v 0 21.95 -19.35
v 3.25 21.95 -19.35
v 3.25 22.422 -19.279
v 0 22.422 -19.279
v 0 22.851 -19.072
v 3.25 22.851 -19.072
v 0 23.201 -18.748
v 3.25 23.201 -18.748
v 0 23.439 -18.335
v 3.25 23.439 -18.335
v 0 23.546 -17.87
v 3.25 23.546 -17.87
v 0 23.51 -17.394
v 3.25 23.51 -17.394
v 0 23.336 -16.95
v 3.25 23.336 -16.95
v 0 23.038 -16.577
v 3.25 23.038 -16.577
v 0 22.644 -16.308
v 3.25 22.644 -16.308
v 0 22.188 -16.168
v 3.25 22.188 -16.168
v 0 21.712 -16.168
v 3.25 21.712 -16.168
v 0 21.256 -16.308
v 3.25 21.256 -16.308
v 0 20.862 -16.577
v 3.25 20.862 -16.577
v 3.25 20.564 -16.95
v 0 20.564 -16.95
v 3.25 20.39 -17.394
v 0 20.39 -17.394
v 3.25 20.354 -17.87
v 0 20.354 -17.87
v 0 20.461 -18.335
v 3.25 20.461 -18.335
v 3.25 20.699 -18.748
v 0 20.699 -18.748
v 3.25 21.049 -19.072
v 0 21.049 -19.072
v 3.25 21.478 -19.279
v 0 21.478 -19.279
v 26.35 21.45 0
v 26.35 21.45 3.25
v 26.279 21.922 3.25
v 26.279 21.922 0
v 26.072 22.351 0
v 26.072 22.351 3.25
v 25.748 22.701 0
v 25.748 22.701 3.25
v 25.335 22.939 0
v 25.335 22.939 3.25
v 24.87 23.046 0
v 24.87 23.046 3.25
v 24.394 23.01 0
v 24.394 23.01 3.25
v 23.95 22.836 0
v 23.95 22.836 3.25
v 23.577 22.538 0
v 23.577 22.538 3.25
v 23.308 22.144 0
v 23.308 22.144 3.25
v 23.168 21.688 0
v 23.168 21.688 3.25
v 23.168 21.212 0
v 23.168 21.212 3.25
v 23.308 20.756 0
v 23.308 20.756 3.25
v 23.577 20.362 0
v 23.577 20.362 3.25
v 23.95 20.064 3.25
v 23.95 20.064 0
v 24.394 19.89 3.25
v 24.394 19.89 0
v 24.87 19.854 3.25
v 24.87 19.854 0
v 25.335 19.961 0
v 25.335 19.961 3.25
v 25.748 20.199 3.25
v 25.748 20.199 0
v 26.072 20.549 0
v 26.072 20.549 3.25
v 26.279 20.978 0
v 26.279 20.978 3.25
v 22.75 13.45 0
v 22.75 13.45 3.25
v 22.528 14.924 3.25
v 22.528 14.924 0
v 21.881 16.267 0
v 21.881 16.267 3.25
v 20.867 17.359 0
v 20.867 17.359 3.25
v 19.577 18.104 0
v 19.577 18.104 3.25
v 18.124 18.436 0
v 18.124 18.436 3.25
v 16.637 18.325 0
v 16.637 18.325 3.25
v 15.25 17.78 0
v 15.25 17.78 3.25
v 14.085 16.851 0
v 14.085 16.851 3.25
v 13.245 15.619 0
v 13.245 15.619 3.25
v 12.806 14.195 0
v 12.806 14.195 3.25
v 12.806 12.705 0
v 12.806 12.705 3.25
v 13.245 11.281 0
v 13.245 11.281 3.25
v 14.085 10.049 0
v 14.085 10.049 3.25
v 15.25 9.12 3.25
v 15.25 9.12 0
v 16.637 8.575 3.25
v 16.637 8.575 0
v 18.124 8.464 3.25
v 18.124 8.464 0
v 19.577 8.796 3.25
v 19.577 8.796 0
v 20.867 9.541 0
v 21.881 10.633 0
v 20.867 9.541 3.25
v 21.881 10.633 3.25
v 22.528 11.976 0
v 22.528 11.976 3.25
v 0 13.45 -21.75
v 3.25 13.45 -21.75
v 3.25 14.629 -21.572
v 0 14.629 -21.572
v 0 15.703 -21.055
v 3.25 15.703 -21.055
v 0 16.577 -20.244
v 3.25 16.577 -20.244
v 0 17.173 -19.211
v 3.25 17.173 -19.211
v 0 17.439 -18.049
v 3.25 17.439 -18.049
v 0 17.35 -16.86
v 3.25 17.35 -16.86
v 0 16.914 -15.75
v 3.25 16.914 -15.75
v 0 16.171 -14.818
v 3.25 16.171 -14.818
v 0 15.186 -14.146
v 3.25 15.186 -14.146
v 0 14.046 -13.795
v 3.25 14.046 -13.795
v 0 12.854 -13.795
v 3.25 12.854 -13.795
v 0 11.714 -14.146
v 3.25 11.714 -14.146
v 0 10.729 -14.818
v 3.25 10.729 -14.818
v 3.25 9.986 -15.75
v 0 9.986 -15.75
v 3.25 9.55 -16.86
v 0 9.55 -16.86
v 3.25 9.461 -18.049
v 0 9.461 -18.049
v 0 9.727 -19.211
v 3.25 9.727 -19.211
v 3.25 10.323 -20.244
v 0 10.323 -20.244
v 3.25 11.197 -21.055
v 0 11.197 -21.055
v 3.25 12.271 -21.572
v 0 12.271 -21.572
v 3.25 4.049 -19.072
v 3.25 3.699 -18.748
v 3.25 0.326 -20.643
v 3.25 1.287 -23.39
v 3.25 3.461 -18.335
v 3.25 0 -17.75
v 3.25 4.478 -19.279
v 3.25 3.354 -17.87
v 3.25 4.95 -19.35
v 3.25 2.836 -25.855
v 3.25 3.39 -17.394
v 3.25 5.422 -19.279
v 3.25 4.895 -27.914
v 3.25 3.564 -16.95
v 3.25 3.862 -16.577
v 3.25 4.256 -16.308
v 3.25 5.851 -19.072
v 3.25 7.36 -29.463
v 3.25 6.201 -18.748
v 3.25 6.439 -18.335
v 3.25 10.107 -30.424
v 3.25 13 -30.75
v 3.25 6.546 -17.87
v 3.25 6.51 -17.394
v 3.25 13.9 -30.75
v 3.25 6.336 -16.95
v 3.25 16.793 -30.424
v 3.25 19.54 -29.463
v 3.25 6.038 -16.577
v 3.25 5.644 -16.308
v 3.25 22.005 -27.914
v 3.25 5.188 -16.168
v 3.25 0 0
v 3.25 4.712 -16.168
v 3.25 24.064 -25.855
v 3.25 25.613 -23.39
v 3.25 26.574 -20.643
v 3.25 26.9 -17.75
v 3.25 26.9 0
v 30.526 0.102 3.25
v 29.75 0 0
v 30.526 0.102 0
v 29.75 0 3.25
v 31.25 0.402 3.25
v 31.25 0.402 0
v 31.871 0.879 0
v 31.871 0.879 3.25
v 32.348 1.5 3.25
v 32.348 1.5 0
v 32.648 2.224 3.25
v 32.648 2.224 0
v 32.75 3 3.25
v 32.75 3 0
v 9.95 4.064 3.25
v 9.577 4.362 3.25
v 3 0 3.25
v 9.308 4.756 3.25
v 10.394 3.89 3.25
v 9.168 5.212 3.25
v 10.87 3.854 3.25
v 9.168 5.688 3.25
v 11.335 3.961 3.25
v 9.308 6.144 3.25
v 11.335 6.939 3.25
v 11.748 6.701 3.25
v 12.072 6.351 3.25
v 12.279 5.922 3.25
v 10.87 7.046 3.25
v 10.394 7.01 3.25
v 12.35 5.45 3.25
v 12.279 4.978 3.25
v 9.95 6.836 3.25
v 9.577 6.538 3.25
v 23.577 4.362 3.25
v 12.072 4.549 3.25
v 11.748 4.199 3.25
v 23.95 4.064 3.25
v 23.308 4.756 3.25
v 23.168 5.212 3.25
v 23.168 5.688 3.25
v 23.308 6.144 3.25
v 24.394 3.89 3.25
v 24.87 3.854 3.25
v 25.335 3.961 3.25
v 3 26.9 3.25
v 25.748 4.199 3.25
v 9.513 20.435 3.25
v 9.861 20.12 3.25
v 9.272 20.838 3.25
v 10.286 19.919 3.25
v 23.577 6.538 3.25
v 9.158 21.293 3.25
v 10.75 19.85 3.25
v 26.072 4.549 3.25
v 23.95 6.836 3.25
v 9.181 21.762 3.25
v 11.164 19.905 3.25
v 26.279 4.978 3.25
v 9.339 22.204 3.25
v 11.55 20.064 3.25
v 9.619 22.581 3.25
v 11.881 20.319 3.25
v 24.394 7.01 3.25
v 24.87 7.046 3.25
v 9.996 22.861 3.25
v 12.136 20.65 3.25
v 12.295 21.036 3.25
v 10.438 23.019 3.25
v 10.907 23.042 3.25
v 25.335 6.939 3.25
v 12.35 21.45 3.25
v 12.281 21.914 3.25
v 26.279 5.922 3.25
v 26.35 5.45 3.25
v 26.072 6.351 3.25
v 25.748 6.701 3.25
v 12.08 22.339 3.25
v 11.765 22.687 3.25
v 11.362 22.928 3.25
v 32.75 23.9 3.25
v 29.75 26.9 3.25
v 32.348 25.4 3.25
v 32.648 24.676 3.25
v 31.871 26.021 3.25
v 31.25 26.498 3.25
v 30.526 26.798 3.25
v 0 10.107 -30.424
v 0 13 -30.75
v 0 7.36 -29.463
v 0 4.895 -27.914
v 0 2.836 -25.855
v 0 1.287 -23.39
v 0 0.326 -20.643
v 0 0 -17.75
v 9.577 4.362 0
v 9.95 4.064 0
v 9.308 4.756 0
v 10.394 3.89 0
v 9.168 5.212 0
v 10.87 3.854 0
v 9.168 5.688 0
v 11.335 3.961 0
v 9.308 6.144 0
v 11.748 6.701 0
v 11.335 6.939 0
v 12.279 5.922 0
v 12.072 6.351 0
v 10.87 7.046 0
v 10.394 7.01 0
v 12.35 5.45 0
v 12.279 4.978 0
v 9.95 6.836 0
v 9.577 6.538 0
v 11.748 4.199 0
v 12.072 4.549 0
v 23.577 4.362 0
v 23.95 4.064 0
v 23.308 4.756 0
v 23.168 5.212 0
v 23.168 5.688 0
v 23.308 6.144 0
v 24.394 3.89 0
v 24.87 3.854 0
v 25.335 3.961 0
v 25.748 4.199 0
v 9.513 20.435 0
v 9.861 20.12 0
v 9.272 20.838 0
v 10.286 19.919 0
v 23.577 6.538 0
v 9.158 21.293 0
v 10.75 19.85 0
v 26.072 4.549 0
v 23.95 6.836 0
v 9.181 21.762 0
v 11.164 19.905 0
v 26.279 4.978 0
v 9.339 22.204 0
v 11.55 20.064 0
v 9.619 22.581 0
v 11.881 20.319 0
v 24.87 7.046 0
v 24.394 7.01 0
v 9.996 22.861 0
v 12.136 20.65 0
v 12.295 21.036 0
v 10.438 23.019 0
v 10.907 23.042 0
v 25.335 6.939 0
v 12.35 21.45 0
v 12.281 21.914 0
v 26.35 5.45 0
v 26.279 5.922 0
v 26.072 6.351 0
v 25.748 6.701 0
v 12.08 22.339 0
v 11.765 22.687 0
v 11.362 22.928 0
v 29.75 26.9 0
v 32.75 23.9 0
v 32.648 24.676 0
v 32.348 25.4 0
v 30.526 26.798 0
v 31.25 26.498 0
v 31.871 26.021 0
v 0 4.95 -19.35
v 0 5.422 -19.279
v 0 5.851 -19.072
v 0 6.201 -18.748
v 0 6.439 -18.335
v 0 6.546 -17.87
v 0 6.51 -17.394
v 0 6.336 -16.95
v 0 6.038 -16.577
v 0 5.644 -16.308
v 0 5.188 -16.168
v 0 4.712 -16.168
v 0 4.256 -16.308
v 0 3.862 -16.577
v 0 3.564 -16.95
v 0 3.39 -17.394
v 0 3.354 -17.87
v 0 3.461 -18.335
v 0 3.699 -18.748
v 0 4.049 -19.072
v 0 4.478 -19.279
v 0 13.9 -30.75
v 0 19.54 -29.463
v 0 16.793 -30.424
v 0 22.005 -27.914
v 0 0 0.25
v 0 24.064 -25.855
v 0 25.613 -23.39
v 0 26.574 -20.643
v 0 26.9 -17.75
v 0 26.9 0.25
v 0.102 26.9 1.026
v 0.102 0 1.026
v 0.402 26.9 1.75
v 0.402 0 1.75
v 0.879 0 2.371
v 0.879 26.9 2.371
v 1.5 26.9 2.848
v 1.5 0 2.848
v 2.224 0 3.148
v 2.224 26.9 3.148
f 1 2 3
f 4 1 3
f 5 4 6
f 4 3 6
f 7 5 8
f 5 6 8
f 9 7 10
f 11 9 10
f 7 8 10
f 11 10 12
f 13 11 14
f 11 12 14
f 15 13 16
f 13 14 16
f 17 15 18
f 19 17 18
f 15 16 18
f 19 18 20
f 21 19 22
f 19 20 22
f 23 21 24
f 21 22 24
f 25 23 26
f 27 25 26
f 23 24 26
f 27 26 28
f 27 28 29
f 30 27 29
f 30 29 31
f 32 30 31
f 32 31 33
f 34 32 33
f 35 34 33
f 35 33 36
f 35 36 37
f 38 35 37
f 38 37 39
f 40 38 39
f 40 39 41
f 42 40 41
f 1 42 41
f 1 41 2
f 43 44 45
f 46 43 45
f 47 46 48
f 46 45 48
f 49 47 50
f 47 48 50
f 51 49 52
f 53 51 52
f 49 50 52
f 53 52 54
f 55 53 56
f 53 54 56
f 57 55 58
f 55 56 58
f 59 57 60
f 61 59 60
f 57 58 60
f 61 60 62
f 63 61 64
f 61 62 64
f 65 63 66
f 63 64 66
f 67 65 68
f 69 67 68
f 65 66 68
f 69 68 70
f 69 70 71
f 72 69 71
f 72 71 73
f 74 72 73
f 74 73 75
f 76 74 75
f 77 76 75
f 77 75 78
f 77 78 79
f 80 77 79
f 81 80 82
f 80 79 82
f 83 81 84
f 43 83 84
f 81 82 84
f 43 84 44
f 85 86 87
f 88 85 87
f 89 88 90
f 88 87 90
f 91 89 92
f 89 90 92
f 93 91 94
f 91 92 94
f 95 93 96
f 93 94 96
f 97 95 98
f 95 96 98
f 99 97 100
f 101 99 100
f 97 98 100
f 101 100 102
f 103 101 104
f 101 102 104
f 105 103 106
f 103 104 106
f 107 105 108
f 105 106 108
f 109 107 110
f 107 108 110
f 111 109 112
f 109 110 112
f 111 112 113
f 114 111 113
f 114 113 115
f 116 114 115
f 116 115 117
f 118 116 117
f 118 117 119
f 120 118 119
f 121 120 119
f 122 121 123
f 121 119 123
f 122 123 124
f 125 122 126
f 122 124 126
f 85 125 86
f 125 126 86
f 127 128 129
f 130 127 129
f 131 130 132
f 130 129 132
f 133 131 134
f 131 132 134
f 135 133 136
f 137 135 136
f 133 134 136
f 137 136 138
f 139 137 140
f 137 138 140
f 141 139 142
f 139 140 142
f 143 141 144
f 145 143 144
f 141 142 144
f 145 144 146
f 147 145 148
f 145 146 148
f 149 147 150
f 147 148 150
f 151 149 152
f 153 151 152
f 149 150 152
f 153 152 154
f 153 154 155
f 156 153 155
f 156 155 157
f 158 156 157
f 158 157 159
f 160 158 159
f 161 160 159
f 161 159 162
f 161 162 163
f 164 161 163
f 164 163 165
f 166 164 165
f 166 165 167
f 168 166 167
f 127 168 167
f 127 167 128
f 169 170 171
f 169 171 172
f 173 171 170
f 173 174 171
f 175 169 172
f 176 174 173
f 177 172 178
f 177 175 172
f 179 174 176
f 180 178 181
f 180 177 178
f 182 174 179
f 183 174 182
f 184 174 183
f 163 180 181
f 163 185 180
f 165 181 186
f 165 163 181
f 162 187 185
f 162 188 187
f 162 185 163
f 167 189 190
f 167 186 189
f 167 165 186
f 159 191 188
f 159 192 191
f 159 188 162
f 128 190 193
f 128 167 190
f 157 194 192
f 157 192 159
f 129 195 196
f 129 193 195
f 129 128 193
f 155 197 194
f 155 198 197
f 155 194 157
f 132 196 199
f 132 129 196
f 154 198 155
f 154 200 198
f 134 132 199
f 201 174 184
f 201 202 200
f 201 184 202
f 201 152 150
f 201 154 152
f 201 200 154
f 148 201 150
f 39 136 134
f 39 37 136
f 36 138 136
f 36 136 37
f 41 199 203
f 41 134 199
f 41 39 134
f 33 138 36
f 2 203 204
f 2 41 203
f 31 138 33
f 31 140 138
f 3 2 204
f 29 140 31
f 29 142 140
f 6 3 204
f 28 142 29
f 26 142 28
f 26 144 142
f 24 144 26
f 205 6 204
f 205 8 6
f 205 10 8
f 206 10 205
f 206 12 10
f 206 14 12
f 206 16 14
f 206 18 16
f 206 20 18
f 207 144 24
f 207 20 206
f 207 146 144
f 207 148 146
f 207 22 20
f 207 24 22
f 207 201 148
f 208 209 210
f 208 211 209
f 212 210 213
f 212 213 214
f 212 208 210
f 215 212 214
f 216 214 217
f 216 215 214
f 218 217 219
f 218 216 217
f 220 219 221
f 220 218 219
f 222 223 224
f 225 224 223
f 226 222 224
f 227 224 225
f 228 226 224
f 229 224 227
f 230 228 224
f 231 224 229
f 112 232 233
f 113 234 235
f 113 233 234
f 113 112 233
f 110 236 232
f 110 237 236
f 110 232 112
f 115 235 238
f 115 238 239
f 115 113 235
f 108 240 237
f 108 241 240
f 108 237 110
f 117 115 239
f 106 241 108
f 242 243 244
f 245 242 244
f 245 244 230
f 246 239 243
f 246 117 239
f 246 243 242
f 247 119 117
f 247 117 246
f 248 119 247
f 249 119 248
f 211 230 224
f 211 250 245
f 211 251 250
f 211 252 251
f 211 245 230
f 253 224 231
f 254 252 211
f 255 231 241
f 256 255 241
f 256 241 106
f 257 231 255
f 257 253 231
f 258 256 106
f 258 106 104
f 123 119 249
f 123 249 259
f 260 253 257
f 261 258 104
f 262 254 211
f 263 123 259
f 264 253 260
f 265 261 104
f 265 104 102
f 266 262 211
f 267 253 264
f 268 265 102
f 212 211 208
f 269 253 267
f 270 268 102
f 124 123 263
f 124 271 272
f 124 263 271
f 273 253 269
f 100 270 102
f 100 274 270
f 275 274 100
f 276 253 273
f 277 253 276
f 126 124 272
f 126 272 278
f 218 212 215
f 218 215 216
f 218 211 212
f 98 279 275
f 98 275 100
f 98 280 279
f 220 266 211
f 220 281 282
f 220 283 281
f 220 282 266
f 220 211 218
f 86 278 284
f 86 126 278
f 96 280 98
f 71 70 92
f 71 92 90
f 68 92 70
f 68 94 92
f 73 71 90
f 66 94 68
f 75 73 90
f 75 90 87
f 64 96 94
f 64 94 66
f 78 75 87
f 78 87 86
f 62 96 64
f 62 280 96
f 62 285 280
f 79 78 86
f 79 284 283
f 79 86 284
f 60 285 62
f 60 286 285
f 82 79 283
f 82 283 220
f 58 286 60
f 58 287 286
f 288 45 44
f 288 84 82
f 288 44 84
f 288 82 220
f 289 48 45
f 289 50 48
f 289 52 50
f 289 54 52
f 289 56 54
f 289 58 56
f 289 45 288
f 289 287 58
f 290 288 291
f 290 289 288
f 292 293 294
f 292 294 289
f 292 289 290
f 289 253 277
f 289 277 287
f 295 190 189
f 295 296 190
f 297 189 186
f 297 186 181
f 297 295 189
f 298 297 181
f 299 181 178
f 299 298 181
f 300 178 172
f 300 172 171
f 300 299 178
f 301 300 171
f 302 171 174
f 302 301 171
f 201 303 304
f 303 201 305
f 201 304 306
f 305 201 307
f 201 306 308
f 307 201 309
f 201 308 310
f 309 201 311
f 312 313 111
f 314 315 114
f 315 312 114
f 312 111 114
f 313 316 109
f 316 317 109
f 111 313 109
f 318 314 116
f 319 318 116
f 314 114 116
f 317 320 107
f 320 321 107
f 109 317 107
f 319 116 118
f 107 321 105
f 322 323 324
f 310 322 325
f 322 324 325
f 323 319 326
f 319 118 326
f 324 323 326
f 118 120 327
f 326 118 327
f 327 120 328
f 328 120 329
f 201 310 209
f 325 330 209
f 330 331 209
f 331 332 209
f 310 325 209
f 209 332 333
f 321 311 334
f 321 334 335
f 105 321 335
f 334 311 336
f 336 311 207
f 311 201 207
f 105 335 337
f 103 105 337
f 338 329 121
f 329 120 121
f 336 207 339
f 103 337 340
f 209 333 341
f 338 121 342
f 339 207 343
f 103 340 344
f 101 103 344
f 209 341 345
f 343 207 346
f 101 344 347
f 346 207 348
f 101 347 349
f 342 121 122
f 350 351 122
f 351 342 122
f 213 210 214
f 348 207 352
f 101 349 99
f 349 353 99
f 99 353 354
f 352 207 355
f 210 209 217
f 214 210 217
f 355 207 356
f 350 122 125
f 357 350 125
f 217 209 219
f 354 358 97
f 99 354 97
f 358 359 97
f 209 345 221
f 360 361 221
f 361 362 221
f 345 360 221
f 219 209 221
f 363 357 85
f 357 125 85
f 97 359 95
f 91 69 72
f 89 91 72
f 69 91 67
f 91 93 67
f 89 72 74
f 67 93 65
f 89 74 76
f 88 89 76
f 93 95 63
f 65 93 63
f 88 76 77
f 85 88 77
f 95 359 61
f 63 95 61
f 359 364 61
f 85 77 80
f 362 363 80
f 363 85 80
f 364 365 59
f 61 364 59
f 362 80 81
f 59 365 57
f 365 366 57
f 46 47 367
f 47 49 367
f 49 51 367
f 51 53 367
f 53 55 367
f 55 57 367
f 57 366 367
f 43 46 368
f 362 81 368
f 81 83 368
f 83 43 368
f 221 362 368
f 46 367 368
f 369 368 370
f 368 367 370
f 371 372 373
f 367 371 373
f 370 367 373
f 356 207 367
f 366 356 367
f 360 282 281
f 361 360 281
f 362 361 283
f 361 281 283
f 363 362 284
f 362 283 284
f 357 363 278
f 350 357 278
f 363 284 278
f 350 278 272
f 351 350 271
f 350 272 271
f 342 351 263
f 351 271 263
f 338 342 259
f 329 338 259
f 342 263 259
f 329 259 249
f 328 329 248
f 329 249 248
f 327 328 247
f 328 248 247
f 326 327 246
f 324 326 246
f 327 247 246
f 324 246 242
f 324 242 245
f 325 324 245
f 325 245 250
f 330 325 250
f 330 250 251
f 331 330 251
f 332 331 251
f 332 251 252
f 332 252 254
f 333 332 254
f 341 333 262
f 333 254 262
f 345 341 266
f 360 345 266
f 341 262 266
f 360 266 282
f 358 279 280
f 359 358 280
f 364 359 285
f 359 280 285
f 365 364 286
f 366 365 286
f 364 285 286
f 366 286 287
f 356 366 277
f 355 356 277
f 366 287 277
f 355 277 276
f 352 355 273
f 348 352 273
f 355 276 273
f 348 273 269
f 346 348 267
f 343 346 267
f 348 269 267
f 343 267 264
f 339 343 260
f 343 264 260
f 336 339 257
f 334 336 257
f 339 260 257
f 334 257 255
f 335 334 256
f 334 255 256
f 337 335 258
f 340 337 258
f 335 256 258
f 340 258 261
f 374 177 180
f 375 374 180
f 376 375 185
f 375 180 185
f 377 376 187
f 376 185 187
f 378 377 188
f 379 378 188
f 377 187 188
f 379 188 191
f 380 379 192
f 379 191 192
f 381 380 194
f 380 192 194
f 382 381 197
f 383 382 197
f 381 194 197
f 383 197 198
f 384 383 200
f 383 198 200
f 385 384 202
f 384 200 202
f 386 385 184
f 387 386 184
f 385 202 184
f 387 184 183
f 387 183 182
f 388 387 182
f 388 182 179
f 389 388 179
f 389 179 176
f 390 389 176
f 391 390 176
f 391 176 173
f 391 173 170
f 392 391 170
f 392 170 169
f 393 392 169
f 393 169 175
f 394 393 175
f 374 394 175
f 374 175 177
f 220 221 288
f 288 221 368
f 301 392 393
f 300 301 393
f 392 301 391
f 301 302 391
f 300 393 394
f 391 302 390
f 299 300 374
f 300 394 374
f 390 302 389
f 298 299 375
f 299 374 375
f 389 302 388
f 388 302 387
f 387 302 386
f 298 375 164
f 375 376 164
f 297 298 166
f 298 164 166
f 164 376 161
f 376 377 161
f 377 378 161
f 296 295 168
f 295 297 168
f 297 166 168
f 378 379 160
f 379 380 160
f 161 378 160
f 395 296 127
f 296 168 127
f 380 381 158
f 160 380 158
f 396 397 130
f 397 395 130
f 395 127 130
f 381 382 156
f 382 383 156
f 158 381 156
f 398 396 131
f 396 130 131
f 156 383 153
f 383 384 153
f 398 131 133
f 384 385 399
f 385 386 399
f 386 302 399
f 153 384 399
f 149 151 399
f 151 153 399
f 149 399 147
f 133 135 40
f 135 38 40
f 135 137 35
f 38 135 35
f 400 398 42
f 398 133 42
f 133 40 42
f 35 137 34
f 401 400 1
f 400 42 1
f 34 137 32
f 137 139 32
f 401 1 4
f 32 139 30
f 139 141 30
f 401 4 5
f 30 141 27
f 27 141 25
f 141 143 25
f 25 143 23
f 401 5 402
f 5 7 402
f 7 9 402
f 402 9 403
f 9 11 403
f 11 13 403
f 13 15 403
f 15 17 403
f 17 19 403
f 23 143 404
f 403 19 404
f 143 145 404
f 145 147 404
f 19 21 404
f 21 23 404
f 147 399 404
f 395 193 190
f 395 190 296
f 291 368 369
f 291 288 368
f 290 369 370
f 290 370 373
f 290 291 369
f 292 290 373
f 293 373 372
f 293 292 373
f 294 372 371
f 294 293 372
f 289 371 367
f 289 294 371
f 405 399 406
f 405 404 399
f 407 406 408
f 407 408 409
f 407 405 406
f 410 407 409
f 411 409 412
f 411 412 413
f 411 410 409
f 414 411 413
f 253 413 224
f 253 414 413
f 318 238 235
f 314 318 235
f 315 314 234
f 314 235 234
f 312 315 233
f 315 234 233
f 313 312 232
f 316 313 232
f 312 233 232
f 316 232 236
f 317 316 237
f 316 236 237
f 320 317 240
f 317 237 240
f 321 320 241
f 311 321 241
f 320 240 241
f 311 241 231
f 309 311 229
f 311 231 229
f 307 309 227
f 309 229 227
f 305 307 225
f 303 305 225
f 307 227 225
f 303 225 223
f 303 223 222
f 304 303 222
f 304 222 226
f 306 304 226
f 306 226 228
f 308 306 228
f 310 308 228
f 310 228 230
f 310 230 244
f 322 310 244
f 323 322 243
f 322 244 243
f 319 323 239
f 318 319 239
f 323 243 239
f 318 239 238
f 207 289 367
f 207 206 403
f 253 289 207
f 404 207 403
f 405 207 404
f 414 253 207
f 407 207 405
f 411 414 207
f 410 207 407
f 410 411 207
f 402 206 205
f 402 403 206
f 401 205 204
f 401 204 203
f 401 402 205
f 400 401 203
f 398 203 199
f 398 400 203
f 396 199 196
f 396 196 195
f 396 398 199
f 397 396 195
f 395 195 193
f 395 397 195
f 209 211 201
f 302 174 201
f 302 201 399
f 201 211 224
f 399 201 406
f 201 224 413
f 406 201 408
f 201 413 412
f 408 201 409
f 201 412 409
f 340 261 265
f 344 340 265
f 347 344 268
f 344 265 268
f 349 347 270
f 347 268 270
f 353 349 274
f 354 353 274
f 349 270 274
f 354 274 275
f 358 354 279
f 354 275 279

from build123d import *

# Parameters (mm, degrees)
SKETCH1_W           = 32.75
SKETCH1_H           = 26.9
BOSS_EXTRUDE1_DEPTH = 3.25
FILLET1_R           = 3
SKETCH2_R           = 5
SKETCH2_R_2         = 1.6
CUT_EXTRUDE1_DEPTH  = 3.25
SKETCH4_W           = 3.25
SKETCH4_H           = 26.9
BOSS_EXTRUDE2_DEPTH = 30.75
FILLET2_R           = 3
SKETCH5_R           = 4
SKETCH5_R_2         = 1.6
CUT_EXTRUDE2_DEPTH  = 30.75
FILLET4_R           = 13


with BuildPart() as part:
    # Sketch1 → Boss-Extrude1 (new body)
    with BuildSketch(Plane.XY):
        with Locations((16.375, 13.45)):
            Rectangle(SKETCH1_W, SKETCH1_H)
    extrude(amount=BOSS_EXTRUDE1_DEPTH)

    # Fillet1
    fillet1_edges = [part.edges().sort_by_distance(p)[0] for p in [
        (32.75, 26.9, 1.625),
        (32.75, 0, 1.625),
    ]]
    fillet(fillet1_edges, radius=FILLET1_R)

    # Sketch2 → Cut-Extrude1 (cut)
    with BuildSketch(Plane.XY.offset(3.25)):
        with BuildLine():
            ThreePointArc((12.35, 21.45), (9.61862915, 22.58137085), (10.75, 19.85))
            Line((10.75, 19.85), (10.75, 21.45))
            Line((10.75, 21.45), (12.35, 21.45))
        make_face()
        with BuildLine():
            Line((10.75, 21.45), (10.75, 19.85))
            ThreePointArc((10.75, 19.85), (11.88137085, 20.31862915), (12.35, 21.45))
            Line((12.35, 21.45), (10.75, 21.45))
        make_face()
        with Locations((17.75, 13.45)):
            Circle(SKETCH2_R)
        with Locations((24.75, 21.45)):
            Circle(SKETCH2_R_2)
        with Locations((24.75, 5.45)):
            Circle(SKETCH2_R_2)
        with Locations((10.75, 5.45)):
            Circle(SKETCH2_R_2)
    extrude(amount=-CUT_EXTRUDE1_DEPTH, mode=Mode.SUBTRACT)

    # Sketch4 → Boss-Extrude2 (add)
    with BuildSketch(Plane(origin=(0, 0, 0), x_dir=(-1, 0, 0), z_dir=(0, 0, -1))):
        with Locations((-1.625, 13.45)):
            Rectangle(SKETCH4_W, SKETCH4_H)
    extrude(amount=BOSS_EXTRUDE2_DEPTH)

    # Fillet2
    fillet2_edges = [part.edges().sort_by_distance(p)[0] for p in [
        (0, 13.45, 3.25),
    ]]
    fillet(fillet2_edges, radius=FILLET2_R)

    # Sketch5 → Cut-Extrude2 (cut)
    with BuildSketch(Plane(origin=(3.25, 0, 0), x_dir=(0, 0, -1), z_dir=(1, 0, 0))):
        with Locations((17.75, 13.45)):
            Circle(SKETCH5_R)
        with Locations((17.75, 21.95)):
            Circle(SKETCH5_R_2)
        with Locations((17.75, 4.95)):
            Circle(SKETCH5_R_2)
    extrude(amount=-CUT_EXTRUDE2_DEPTH, mode=Mode.SUBTRACT)

    # Fillet4
    fillet4_edges = [part.edges().sort_by_distance(p)[0] for p in [
        (1.625, 26.9, -30.75),
        (1.625, 0, -30.75),
    ]]
    fillet(fillet4_edges, radius=FILLET4_R)


solid = part.part
